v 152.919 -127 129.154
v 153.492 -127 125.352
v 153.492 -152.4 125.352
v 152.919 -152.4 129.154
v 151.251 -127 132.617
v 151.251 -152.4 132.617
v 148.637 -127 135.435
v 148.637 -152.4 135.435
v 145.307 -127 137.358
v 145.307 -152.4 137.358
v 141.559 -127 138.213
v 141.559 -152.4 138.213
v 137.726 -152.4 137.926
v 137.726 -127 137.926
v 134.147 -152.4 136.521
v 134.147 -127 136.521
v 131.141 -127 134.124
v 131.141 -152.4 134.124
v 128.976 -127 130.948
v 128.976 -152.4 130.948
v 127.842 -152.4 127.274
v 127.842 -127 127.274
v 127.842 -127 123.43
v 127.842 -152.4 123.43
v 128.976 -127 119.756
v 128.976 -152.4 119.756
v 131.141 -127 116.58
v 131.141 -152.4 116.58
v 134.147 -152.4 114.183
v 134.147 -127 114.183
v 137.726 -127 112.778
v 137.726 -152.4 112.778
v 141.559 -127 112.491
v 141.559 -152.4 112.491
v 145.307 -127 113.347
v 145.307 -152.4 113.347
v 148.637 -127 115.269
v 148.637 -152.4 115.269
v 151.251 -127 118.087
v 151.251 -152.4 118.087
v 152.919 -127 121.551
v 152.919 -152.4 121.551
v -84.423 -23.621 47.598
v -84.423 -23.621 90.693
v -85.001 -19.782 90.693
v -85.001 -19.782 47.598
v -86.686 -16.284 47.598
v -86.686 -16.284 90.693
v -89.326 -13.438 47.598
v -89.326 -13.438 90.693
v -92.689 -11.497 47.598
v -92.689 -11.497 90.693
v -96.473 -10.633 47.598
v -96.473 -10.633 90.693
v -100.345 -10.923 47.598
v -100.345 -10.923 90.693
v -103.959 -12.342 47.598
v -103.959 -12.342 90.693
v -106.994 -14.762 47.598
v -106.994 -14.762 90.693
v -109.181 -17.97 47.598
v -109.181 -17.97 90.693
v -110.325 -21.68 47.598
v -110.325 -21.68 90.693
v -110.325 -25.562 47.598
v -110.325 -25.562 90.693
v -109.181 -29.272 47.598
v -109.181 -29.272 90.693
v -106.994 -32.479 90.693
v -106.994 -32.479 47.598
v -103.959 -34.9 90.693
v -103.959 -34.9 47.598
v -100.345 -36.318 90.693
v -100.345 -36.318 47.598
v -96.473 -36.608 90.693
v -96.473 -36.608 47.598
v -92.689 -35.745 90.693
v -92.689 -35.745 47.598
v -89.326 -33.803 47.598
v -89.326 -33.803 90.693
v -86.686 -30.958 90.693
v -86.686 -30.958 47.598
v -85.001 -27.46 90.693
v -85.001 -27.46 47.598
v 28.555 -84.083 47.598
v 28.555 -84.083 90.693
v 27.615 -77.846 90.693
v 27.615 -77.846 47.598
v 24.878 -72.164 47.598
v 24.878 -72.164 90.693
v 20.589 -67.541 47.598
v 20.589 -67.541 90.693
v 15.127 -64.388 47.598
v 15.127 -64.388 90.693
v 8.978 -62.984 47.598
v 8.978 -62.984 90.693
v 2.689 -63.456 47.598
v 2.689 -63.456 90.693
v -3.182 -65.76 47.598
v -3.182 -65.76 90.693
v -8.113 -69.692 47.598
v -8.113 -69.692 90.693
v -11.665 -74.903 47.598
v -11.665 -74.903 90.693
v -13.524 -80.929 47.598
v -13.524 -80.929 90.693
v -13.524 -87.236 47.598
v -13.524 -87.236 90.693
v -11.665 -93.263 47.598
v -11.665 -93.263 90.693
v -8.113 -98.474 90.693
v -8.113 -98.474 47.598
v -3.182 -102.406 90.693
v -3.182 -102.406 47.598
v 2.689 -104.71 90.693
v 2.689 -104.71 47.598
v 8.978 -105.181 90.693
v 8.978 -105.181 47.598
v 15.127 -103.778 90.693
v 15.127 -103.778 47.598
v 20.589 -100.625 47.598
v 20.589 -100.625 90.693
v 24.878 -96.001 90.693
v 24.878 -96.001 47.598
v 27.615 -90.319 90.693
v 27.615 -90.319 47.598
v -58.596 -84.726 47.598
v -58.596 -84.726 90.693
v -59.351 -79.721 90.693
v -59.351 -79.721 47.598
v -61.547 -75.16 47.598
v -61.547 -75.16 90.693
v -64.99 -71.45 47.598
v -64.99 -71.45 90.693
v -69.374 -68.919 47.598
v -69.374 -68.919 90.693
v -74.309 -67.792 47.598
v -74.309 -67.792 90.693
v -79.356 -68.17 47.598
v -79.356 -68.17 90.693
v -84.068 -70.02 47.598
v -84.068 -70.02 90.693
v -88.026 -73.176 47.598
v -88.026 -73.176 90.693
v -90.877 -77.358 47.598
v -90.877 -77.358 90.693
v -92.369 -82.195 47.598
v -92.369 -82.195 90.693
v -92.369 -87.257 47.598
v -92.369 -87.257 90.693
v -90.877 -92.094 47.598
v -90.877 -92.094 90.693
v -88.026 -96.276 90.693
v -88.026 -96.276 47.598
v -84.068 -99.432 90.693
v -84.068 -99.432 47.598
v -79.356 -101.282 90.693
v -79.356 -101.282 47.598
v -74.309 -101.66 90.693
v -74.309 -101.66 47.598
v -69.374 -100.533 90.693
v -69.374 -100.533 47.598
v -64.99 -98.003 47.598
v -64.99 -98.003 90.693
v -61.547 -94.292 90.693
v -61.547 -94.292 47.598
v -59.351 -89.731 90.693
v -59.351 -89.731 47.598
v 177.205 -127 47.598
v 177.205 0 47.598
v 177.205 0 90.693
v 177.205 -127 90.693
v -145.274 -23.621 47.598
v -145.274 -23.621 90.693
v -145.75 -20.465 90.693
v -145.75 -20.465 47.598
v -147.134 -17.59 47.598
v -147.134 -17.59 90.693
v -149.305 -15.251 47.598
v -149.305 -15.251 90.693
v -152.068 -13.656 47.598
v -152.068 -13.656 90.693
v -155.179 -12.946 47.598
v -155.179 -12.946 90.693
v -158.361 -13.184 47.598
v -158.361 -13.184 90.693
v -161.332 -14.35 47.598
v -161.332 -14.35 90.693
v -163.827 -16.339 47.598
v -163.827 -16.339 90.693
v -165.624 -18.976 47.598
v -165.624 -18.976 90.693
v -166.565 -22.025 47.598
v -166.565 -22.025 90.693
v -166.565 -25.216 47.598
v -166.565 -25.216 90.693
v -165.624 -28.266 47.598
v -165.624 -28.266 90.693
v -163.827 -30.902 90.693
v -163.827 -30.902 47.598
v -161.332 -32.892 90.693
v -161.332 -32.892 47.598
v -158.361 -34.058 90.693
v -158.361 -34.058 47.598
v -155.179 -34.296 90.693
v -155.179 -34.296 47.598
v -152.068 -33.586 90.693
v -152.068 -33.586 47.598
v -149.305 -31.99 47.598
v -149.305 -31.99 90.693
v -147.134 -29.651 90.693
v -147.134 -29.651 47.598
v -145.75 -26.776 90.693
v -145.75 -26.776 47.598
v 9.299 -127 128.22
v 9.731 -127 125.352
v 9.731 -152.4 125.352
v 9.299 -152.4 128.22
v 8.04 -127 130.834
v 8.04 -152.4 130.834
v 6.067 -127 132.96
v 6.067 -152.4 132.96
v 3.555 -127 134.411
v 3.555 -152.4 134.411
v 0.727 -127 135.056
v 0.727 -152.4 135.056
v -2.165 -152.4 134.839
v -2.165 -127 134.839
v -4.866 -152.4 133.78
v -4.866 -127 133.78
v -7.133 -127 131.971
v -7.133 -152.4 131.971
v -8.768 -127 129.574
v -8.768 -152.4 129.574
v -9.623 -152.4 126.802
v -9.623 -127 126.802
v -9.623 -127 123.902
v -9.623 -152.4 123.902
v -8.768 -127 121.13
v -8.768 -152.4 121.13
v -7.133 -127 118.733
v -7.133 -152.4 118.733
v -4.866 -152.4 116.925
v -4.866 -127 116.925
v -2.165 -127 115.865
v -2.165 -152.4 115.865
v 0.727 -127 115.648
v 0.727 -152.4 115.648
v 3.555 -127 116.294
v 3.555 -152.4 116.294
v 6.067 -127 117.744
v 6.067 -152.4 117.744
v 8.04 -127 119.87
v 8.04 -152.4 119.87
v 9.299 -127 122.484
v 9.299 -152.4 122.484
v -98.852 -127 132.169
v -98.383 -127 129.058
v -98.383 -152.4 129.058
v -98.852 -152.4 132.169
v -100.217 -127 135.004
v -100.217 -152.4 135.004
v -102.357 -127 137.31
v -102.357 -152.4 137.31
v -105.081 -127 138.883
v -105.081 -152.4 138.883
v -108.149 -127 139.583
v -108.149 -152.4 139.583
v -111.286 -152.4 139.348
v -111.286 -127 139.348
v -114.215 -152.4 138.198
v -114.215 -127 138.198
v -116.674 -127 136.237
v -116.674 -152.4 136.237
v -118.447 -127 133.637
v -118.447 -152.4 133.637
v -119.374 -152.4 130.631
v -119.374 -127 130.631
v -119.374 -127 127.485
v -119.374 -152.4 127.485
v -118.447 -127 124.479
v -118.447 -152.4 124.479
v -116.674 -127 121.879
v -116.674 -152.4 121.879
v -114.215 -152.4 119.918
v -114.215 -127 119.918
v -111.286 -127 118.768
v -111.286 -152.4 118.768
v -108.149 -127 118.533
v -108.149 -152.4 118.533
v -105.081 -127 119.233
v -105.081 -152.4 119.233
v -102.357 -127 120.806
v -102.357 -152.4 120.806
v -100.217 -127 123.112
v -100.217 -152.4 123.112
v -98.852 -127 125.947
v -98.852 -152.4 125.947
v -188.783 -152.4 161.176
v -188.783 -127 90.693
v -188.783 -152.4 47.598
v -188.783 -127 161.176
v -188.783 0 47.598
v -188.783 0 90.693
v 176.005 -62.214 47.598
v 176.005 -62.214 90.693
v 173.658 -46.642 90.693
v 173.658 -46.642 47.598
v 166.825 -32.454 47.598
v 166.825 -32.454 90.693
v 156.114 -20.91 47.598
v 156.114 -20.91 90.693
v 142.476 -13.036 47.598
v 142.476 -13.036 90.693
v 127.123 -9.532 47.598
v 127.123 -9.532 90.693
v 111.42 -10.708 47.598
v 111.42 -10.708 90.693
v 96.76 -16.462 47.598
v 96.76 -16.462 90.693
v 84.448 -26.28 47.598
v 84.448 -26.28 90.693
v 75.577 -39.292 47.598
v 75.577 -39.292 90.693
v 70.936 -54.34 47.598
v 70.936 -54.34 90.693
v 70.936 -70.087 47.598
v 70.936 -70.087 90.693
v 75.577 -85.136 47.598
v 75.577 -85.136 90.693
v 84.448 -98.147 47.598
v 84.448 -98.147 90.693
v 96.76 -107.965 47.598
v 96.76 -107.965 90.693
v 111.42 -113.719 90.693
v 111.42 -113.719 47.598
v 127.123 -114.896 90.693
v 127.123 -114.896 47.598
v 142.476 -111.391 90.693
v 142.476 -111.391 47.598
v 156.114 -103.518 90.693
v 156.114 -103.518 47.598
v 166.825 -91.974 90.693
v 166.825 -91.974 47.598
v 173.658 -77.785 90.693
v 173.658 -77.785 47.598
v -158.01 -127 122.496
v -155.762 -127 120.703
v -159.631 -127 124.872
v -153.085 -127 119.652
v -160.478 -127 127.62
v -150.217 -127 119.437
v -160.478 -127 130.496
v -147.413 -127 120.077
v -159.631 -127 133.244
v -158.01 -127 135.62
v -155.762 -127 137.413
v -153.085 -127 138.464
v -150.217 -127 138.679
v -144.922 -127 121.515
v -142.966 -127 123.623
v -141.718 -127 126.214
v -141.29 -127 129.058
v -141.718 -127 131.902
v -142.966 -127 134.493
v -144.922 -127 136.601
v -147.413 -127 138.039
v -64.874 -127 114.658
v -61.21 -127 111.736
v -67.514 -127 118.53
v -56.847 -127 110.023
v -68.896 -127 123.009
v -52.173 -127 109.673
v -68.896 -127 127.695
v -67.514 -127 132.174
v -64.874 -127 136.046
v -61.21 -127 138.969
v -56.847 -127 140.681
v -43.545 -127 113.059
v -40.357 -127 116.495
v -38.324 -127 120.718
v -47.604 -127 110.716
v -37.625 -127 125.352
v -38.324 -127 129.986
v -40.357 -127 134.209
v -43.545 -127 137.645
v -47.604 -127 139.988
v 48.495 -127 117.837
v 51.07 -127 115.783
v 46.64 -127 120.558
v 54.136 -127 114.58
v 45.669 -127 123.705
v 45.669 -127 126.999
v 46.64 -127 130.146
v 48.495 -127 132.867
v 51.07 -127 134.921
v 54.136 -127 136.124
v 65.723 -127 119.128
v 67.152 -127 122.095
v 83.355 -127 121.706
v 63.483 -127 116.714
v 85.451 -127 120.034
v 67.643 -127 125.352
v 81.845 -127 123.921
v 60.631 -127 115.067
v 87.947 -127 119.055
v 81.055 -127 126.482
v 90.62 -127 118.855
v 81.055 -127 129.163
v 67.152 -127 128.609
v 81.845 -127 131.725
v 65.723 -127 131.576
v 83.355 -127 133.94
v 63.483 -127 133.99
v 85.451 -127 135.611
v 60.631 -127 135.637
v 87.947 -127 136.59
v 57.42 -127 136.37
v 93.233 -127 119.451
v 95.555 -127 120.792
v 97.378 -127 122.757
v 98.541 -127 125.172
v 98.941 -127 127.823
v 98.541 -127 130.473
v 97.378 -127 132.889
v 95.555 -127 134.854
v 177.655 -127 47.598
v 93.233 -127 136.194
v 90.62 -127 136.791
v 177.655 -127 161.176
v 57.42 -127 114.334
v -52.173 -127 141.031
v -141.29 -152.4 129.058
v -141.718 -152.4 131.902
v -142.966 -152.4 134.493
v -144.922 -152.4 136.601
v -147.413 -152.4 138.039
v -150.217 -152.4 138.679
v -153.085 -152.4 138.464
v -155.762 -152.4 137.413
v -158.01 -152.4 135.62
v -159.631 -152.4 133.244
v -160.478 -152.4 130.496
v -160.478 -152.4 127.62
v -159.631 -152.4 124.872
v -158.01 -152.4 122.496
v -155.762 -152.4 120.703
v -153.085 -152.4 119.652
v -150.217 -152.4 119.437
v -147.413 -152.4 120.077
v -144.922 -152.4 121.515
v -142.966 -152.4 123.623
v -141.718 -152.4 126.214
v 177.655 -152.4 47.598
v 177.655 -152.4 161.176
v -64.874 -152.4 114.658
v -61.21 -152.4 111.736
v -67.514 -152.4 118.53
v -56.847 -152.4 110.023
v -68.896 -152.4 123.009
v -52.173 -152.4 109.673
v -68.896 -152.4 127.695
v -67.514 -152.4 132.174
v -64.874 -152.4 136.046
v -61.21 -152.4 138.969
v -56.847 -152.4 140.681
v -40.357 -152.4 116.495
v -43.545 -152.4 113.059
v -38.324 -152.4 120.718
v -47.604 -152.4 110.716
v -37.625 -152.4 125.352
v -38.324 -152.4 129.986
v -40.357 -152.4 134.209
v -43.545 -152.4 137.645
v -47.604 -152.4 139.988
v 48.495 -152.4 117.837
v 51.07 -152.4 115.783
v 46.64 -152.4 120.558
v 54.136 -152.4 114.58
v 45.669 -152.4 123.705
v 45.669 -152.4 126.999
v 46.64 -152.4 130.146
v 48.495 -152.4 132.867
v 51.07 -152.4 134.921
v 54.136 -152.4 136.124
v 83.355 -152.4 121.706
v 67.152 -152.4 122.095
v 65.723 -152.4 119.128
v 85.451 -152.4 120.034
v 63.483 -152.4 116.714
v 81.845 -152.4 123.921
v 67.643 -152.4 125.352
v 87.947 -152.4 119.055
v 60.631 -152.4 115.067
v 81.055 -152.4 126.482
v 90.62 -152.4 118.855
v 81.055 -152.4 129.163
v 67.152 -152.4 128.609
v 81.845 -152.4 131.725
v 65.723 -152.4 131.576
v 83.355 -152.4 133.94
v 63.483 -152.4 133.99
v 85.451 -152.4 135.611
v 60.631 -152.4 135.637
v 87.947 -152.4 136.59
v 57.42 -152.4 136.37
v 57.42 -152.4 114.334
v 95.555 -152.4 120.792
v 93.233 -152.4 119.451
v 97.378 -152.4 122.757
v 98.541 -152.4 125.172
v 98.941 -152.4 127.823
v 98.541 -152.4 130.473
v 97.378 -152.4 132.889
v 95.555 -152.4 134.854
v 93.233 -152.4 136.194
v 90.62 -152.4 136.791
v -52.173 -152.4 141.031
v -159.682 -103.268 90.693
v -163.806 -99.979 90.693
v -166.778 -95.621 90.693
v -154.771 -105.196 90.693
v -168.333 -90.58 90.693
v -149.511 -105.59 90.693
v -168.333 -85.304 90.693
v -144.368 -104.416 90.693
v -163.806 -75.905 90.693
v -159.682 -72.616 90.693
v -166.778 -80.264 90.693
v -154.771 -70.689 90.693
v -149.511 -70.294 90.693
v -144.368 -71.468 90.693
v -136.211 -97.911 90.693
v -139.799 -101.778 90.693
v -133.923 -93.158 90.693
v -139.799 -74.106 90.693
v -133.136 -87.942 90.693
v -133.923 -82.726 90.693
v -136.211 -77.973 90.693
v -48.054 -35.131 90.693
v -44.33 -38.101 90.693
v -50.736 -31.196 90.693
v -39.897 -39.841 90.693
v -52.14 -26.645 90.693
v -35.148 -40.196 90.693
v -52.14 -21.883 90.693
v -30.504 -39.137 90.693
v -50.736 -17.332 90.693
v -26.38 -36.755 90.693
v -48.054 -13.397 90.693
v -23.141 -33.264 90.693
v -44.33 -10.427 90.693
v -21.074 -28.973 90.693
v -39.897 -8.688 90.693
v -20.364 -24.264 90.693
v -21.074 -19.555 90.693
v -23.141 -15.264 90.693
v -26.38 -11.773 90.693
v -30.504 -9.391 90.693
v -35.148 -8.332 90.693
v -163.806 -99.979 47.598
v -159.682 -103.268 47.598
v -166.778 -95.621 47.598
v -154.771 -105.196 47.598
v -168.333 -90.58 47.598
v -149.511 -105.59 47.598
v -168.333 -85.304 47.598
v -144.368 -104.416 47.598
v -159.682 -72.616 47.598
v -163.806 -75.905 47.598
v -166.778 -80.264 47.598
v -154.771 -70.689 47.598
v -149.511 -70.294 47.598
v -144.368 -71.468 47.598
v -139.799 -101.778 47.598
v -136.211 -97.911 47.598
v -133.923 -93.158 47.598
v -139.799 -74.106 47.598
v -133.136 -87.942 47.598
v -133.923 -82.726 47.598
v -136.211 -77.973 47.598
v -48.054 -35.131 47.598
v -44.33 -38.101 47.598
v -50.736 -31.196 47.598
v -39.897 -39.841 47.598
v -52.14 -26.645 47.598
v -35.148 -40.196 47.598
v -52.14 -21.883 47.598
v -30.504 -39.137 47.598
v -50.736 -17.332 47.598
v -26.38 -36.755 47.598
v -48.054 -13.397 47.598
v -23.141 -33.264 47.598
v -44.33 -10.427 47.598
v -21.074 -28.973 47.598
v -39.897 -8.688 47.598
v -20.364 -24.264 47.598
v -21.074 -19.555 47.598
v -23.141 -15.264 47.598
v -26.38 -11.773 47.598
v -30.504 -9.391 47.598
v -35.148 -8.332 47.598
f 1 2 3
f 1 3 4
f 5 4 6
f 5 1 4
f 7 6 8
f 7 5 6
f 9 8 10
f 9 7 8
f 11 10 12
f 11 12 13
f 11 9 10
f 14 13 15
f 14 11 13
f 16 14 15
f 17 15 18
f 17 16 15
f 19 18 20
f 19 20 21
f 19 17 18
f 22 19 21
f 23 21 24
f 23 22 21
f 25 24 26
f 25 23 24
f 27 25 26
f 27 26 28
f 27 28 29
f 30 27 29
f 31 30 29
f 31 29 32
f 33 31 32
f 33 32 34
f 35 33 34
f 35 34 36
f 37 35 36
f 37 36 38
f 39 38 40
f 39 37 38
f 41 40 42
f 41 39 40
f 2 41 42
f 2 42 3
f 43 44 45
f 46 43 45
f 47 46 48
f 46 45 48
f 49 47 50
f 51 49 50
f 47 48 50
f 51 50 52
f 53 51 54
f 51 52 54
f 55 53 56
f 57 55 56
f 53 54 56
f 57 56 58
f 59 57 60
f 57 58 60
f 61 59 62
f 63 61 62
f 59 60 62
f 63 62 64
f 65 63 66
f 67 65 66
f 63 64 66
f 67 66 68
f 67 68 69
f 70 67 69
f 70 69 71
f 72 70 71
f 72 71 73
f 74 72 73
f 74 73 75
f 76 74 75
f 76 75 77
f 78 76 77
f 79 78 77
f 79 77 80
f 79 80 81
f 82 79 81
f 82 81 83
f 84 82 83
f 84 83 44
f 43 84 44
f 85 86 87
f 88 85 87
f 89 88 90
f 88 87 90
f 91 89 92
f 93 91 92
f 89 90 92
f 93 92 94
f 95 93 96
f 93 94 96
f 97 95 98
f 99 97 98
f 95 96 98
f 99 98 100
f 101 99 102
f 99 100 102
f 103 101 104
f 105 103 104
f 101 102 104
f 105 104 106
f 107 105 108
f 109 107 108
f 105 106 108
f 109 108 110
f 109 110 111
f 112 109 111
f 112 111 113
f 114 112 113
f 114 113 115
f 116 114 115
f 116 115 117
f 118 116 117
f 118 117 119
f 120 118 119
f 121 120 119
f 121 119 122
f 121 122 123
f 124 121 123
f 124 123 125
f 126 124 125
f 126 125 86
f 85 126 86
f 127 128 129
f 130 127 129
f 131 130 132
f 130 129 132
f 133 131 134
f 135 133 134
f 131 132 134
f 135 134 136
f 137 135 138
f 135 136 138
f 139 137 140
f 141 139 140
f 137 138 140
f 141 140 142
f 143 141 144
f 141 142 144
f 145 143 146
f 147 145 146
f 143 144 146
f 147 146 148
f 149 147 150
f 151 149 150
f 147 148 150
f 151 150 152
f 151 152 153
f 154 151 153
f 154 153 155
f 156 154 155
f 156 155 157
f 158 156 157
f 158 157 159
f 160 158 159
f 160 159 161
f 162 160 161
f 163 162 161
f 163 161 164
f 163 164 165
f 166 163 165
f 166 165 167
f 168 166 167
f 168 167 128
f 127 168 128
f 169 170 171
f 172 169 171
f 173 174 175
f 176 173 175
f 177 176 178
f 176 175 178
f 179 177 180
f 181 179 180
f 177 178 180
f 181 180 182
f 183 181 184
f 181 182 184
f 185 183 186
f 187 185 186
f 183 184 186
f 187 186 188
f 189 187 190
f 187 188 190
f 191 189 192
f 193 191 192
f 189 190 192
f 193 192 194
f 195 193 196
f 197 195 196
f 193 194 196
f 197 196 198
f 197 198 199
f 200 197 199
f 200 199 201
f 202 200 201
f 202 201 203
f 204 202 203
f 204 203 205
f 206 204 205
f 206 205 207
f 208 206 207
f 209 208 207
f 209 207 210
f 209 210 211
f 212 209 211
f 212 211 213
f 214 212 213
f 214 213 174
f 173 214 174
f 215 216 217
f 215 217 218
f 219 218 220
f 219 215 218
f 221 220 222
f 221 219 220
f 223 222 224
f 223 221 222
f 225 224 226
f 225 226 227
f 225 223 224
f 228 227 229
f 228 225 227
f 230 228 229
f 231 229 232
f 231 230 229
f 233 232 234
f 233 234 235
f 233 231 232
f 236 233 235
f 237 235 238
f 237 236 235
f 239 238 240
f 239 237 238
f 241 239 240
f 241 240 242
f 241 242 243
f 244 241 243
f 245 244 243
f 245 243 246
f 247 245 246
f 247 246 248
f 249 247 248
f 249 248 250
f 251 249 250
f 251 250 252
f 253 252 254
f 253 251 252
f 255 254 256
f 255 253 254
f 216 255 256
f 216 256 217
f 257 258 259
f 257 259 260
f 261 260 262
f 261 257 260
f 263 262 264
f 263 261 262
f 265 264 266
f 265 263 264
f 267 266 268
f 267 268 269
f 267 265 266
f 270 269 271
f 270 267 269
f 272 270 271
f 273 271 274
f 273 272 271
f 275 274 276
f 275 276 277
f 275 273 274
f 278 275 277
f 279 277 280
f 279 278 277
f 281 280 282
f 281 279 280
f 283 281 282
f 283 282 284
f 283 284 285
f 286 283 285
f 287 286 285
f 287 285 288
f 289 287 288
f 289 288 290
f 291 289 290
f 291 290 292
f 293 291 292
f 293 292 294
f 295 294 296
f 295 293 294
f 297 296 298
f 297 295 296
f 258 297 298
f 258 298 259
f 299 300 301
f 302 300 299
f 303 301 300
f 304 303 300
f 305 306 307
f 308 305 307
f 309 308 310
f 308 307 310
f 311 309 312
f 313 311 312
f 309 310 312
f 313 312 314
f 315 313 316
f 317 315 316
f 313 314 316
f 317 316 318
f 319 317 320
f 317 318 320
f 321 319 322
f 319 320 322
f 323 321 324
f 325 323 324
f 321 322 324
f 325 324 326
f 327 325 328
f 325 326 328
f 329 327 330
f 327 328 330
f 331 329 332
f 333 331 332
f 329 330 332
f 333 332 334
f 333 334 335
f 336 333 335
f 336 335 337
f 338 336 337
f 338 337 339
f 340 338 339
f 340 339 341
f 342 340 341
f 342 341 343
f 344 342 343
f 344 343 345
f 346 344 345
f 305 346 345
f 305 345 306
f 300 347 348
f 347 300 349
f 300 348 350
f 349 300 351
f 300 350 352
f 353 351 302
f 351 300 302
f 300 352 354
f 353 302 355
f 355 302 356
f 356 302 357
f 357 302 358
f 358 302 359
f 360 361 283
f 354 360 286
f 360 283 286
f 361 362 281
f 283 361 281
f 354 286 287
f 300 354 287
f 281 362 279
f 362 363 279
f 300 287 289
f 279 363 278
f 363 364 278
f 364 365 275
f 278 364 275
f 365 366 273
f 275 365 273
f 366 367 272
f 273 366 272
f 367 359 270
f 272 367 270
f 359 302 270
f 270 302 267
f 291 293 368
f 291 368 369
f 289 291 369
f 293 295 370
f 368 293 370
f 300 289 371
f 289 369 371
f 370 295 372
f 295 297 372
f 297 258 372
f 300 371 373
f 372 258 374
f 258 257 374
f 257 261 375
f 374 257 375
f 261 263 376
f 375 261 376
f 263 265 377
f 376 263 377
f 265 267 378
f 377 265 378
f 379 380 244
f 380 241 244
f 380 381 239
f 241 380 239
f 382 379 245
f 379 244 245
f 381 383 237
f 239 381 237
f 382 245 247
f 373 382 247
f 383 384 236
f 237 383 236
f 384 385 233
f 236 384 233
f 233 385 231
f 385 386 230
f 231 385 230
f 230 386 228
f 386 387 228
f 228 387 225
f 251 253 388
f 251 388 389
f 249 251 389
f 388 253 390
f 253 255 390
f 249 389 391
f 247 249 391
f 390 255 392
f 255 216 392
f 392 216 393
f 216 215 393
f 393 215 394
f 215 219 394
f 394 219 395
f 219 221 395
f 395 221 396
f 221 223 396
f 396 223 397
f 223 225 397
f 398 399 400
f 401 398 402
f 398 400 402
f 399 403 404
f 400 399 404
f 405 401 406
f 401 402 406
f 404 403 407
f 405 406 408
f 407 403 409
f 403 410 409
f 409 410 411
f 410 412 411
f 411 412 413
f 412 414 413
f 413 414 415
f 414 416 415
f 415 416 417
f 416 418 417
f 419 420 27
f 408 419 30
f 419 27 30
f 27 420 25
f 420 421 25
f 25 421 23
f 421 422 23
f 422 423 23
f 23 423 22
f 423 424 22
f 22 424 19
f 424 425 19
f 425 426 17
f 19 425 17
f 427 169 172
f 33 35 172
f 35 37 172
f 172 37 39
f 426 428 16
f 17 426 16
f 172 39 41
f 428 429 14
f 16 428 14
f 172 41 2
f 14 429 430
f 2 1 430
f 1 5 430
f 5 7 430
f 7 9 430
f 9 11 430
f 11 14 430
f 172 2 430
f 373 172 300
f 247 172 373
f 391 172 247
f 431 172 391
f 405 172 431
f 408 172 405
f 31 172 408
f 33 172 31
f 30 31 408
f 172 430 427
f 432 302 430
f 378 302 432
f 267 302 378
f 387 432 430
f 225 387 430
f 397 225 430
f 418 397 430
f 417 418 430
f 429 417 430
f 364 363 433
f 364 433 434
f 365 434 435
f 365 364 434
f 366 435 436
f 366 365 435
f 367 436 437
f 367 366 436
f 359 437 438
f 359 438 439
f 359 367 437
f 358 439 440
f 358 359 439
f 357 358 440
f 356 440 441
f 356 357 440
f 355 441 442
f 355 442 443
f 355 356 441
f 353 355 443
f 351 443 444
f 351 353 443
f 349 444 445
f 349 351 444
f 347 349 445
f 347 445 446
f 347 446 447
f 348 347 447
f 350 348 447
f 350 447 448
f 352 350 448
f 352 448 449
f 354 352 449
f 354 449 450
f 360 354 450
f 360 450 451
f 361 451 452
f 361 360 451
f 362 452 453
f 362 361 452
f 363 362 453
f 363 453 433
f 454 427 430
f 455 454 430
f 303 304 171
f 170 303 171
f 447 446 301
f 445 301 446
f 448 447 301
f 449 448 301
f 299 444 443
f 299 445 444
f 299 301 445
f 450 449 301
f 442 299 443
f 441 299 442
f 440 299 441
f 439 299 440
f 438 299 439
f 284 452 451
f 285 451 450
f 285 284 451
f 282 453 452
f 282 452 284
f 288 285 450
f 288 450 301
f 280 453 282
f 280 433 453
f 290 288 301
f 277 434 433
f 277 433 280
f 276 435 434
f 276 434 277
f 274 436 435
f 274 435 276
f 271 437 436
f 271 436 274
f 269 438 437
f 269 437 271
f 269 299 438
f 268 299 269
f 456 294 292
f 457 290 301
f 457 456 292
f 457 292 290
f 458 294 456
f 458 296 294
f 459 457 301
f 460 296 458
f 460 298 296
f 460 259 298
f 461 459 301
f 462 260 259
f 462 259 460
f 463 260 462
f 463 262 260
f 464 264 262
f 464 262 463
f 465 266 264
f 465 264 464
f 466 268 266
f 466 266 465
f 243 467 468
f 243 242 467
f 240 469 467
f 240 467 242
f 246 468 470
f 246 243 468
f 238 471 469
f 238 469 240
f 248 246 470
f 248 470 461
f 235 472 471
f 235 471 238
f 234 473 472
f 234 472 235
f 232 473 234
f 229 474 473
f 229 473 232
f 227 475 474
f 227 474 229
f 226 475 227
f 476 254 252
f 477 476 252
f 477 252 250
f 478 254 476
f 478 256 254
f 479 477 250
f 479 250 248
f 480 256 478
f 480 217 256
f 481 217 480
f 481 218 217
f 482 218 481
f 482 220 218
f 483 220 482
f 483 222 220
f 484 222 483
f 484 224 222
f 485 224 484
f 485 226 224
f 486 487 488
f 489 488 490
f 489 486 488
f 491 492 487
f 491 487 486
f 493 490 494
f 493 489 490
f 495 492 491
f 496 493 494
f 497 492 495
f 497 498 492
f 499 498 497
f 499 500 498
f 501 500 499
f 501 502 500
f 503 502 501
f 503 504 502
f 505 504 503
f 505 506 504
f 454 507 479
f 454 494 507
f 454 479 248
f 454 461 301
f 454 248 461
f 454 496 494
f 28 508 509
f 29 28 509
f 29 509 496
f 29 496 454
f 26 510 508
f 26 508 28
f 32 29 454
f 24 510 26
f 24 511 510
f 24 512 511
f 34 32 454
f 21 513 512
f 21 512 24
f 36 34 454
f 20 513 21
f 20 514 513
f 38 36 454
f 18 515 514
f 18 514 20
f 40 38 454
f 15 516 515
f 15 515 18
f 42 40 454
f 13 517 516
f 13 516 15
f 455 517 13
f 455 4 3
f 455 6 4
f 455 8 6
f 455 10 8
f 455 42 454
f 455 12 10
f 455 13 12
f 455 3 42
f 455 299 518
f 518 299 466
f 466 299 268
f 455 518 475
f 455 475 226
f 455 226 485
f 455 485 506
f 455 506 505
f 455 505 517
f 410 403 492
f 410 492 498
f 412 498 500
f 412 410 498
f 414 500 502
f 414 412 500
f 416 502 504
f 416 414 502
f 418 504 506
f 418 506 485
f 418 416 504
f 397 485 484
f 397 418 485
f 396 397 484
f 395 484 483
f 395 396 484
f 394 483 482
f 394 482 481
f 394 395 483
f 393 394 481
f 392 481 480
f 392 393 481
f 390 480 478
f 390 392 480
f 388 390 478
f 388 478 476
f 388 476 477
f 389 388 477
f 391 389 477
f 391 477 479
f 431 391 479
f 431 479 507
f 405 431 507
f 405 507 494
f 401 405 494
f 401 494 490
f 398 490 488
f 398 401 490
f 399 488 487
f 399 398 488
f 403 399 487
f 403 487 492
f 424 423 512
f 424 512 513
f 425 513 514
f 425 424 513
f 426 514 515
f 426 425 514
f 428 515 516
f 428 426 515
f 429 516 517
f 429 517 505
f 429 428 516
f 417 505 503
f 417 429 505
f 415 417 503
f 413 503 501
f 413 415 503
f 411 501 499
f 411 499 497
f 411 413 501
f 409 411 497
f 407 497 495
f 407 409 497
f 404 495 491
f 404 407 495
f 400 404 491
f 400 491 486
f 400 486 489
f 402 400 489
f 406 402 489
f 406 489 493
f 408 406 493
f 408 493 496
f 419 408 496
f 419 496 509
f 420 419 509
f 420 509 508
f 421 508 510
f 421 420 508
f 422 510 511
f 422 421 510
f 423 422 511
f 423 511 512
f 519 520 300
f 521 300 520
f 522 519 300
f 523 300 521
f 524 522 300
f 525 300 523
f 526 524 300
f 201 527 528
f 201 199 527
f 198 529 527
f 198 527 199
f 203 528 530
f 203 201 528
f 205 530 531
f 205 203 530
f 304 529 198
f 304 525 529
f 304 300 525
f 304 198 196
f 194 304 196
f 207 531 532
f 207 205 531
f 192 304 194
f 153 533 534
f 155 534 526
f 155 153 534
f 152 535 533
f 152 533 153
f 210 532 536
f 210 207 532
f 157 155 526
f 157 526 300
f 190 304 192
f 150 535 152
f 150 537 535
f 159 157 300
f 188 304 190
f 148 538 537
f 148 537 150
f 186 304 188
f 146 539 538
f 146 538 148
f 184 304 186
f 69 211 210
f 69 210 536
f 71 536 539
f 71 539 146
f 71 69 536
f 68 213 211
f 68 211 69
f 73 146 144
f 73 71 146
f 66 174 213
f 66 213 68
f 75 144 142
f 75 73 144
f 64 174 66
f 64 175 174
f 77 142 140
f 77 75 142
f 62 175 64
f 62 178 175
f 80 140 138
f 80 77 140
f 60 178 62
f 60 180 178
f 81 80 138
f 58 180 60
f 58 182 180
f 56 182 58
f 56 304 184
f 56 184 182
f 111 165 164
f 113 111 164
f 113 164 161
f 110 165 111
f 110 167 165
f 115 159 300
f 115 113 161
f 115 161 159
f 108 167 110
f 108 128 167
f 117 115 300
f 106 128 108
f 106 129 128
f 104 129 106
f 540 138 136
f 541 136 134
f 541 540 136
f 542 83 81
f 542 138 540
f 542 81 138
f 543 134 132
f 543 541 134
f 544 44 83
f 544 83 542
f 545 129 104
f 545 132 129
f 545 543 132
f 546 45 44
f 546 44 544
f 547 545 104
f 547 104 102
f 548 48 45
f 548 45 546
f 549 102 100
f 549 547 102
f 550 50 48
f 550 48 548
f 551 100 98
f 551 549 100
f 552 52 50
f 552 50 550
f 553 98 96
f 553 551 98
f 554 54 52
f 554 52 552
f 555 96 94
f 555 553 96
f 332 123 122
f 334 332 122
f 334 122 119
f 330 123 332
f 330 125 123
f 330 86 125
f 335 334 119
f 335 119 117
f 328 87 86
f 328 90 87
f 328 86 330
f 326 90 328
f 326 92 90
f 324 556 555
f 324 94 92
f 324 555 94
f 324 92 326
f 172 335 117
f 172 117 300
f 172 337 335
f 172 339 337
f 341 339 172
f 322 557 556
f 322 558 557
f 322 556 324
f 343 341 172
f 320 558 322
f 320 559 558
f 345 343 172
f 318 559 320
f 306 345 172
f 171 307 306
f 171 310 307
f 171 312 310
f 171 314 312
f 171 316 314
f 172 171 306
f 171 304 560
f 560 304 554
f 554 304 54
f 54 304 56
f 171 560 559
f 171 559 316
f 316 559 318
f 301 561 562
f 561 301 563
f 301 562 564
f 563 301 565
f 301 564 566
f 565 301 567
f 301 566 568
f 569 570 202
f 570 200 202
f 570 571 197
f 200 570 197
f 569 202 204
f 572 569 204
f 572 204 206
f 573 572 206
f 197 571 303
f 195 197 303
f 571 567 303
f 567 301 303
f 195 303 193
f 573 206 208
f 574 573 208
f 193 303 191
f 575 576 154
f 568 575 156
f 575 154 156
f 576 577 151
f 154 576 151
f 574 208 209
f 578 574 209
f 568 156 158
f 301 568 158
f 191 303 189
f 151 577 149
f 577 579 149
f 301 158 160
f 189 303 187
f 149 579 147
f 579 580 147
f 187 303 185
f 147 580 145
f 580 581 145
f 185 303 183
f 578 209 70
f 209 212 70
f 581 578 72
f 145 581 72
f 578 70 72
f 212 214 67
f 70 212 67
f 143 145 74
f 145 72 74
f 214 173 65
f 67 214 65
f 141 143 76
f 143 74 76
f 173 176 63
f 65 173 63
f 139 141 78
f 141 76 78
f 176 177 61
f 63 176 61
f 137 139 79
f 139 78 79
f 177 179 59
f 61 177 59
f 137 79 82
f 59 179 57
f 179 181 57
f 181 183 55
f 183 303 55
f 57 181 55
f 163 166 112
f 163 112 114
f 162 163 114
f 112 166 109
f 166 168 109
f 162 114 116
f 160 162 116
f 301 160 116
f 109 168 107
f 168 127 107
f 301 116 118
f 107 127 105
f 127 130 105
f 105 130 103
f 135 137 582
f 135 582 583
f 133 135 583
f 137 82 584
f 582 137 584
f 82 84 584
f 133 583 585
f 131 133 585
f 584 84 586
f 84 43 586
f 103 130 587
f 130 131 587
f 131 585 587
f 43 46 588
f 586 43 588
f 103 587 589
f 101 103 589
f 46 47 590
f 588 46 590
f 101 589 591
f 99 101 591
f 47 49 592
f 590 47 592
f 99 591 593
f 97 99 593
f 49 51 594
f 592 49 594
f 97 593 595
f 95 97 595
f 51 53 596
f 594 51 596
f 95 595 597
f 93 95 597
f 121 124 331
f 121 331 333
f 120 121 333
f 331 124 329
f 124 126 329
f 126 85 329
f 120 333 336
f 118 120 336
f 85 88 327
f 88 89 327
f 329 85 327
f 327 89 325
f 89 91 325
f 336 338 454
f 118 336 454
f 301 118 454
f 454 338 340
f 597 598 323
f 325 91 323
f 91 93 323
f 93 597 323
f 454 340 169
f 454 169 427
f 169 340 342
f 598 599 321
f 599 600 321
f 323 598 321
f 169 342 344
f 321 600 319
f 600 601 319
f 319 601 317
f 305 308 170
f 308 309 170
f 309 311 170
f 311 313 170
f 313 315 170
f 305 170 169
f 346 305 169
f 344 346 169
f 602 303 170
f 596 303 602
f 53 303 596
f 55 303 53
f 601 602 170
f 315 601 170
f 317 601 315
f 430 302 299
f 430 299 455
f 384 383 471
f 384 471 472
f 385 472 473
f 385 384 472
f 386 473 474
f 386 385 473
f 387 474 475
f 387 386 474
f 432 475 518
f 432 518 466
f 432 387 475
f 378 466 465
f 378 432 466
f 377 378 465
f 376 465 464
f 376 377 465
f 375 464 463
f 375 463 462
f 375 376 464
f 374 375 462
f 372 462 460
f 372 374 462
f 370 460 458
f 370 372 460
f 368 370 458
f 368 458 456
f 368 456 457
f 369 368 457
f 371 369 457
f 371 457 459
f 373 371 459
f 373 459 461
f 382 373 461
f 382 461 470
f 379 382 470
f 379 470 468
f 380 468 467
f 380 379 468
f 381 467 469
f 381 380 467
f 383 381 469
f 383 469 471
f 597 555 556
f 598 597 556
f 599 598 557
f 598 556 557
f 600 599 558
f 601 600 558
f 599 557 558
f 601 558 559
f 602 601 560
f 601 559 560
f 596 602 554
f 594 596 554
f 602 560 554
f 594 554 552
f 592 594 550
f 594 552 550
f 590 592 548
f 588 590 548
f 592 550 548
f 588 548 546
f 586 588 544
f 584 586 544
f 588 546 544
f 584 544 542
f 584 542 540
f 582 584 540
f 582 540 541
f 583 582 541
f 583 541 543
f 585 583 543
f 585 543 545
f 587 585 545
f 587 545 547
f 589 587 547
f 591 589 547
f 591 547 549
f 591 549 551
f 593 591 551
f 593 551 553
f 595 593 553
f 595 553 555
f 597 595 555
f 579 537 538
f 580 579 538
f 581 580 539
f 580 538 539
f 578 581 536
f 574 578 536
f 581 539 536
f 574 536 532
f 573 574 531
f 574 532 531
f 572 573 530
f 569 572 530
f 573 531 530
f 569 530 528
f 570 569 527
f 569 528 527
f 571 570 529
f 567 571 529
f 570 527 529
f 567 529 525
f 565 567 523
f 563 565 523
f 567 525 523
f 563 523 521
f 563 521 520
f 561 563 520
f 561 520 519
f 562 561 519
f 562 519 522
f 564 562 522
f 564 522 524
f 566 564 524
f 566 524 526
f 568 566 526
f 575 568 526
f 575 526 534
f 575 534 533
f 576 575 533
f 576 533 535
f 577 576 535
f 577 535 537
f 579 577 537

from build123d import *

# Parameters (mm, degrees)
F0_W     = 365.9882545471
F0_H     = 43.0952832103
F1_DEPTH = 127
F2_R     = 17.6971191765
F2_R_2   = 10.7051972913
F2_R_3   = 13.0240698206
F2_R_4   = 16.9813148573
F2_R_5   = 21.1576979937
F2_R_6   = 15.977077603
F2_R_7   = 52.8296986553
F3_DEPTH = 254
F4_W     = 366.437792778
F4_H     = 113.5783046484
F4_R     = 9.6480808664
F4_R_2   = 10.5544944744
F4_R_3   = 15.7229424231
F4_R_4   = 9.7312286453
F4_R_5   = 11.0489584241
F4_R_6   = 8.9931980907
F4_R_7   = 12.8970231178
F5_DEPTH = 25.4


with BuildPart() as f1:
    # F0 (on Front) → F1 (new body)
    with BuildSketch(Plane.XZ):
        with Locations((-5.7889074087, 69.1454075277)):
            Rectangle(F0_W, F0_H)
    extrude(amount=F1_DEPTH)

    # F2 (on face) → F3 (cut)
    with BuildSketch(Plane.XY.offset(90.6930491328)):
        with Locations((-150.8334428072, -87.9421010613)):
            Circle(F2_R)
        with Locations((-155.9791564941, -23.6207954586)):
            Circle(F2_R_2)
        with Locations((-97.4467620254, -23.6207954586)):
            Circle(F2_R_3)
        with Locations((-75.577519834, -84.7260355949)):
            Circle(F2_R_4)
        with Locations((7.3969732039, -84.082826972)):
            Circle(F2_R_5)
        with Locations((-36.3415181637, -24.2640078068)):
            Circle(F2_R_6)
        with Locations((123.1753155589, -62.2135810554)):
            Circle(F2_R_7)
    extrude(amount=-F3_DEPTH, mode=Mode.SUBTRACT)

    # F4 (on face) → F5 (join)
    with BuildSketch(Plane.XZ.offset(127)):
        with Locations((-5.5641382933, 104.3869182467)):
            Rectangle(F4_W, F4_H)
        with Locations((-150.9379148483, 129.0579885244)):
            Circle(F4_R, mode=Mode.SUBTRACT)
        with Locations((-108.9373454452, 129.0579885244)):
            Circle(F4_R_2, mode=Mode.SUBTRACT)
        with Locations((-53.3483624458, 125.3520548344)):
            Circle(F4_R_3, mode=Mode.SUBTRACT)
        with Locations((0, 125.3520548344)):
            Circle(F4_R_4, mode=Mode.SUBTRACT)
        with Locations((56.5943047404, 125.3520548344)):
            Circle(F4_R_5, mode=Mode.SUBTRACT)
        with Locations((89.9476930499, 127.8226822615)):
            Circle(F4_R_6, mode=Mode.SUBTRACT)
        with Locations((140.5954509974, 125.3520548344)):
            Circle(F4_R_7, mode=Mode.SUBTRACT)
    extrude(amount=F5_DEPTH)


solid = f1.part
